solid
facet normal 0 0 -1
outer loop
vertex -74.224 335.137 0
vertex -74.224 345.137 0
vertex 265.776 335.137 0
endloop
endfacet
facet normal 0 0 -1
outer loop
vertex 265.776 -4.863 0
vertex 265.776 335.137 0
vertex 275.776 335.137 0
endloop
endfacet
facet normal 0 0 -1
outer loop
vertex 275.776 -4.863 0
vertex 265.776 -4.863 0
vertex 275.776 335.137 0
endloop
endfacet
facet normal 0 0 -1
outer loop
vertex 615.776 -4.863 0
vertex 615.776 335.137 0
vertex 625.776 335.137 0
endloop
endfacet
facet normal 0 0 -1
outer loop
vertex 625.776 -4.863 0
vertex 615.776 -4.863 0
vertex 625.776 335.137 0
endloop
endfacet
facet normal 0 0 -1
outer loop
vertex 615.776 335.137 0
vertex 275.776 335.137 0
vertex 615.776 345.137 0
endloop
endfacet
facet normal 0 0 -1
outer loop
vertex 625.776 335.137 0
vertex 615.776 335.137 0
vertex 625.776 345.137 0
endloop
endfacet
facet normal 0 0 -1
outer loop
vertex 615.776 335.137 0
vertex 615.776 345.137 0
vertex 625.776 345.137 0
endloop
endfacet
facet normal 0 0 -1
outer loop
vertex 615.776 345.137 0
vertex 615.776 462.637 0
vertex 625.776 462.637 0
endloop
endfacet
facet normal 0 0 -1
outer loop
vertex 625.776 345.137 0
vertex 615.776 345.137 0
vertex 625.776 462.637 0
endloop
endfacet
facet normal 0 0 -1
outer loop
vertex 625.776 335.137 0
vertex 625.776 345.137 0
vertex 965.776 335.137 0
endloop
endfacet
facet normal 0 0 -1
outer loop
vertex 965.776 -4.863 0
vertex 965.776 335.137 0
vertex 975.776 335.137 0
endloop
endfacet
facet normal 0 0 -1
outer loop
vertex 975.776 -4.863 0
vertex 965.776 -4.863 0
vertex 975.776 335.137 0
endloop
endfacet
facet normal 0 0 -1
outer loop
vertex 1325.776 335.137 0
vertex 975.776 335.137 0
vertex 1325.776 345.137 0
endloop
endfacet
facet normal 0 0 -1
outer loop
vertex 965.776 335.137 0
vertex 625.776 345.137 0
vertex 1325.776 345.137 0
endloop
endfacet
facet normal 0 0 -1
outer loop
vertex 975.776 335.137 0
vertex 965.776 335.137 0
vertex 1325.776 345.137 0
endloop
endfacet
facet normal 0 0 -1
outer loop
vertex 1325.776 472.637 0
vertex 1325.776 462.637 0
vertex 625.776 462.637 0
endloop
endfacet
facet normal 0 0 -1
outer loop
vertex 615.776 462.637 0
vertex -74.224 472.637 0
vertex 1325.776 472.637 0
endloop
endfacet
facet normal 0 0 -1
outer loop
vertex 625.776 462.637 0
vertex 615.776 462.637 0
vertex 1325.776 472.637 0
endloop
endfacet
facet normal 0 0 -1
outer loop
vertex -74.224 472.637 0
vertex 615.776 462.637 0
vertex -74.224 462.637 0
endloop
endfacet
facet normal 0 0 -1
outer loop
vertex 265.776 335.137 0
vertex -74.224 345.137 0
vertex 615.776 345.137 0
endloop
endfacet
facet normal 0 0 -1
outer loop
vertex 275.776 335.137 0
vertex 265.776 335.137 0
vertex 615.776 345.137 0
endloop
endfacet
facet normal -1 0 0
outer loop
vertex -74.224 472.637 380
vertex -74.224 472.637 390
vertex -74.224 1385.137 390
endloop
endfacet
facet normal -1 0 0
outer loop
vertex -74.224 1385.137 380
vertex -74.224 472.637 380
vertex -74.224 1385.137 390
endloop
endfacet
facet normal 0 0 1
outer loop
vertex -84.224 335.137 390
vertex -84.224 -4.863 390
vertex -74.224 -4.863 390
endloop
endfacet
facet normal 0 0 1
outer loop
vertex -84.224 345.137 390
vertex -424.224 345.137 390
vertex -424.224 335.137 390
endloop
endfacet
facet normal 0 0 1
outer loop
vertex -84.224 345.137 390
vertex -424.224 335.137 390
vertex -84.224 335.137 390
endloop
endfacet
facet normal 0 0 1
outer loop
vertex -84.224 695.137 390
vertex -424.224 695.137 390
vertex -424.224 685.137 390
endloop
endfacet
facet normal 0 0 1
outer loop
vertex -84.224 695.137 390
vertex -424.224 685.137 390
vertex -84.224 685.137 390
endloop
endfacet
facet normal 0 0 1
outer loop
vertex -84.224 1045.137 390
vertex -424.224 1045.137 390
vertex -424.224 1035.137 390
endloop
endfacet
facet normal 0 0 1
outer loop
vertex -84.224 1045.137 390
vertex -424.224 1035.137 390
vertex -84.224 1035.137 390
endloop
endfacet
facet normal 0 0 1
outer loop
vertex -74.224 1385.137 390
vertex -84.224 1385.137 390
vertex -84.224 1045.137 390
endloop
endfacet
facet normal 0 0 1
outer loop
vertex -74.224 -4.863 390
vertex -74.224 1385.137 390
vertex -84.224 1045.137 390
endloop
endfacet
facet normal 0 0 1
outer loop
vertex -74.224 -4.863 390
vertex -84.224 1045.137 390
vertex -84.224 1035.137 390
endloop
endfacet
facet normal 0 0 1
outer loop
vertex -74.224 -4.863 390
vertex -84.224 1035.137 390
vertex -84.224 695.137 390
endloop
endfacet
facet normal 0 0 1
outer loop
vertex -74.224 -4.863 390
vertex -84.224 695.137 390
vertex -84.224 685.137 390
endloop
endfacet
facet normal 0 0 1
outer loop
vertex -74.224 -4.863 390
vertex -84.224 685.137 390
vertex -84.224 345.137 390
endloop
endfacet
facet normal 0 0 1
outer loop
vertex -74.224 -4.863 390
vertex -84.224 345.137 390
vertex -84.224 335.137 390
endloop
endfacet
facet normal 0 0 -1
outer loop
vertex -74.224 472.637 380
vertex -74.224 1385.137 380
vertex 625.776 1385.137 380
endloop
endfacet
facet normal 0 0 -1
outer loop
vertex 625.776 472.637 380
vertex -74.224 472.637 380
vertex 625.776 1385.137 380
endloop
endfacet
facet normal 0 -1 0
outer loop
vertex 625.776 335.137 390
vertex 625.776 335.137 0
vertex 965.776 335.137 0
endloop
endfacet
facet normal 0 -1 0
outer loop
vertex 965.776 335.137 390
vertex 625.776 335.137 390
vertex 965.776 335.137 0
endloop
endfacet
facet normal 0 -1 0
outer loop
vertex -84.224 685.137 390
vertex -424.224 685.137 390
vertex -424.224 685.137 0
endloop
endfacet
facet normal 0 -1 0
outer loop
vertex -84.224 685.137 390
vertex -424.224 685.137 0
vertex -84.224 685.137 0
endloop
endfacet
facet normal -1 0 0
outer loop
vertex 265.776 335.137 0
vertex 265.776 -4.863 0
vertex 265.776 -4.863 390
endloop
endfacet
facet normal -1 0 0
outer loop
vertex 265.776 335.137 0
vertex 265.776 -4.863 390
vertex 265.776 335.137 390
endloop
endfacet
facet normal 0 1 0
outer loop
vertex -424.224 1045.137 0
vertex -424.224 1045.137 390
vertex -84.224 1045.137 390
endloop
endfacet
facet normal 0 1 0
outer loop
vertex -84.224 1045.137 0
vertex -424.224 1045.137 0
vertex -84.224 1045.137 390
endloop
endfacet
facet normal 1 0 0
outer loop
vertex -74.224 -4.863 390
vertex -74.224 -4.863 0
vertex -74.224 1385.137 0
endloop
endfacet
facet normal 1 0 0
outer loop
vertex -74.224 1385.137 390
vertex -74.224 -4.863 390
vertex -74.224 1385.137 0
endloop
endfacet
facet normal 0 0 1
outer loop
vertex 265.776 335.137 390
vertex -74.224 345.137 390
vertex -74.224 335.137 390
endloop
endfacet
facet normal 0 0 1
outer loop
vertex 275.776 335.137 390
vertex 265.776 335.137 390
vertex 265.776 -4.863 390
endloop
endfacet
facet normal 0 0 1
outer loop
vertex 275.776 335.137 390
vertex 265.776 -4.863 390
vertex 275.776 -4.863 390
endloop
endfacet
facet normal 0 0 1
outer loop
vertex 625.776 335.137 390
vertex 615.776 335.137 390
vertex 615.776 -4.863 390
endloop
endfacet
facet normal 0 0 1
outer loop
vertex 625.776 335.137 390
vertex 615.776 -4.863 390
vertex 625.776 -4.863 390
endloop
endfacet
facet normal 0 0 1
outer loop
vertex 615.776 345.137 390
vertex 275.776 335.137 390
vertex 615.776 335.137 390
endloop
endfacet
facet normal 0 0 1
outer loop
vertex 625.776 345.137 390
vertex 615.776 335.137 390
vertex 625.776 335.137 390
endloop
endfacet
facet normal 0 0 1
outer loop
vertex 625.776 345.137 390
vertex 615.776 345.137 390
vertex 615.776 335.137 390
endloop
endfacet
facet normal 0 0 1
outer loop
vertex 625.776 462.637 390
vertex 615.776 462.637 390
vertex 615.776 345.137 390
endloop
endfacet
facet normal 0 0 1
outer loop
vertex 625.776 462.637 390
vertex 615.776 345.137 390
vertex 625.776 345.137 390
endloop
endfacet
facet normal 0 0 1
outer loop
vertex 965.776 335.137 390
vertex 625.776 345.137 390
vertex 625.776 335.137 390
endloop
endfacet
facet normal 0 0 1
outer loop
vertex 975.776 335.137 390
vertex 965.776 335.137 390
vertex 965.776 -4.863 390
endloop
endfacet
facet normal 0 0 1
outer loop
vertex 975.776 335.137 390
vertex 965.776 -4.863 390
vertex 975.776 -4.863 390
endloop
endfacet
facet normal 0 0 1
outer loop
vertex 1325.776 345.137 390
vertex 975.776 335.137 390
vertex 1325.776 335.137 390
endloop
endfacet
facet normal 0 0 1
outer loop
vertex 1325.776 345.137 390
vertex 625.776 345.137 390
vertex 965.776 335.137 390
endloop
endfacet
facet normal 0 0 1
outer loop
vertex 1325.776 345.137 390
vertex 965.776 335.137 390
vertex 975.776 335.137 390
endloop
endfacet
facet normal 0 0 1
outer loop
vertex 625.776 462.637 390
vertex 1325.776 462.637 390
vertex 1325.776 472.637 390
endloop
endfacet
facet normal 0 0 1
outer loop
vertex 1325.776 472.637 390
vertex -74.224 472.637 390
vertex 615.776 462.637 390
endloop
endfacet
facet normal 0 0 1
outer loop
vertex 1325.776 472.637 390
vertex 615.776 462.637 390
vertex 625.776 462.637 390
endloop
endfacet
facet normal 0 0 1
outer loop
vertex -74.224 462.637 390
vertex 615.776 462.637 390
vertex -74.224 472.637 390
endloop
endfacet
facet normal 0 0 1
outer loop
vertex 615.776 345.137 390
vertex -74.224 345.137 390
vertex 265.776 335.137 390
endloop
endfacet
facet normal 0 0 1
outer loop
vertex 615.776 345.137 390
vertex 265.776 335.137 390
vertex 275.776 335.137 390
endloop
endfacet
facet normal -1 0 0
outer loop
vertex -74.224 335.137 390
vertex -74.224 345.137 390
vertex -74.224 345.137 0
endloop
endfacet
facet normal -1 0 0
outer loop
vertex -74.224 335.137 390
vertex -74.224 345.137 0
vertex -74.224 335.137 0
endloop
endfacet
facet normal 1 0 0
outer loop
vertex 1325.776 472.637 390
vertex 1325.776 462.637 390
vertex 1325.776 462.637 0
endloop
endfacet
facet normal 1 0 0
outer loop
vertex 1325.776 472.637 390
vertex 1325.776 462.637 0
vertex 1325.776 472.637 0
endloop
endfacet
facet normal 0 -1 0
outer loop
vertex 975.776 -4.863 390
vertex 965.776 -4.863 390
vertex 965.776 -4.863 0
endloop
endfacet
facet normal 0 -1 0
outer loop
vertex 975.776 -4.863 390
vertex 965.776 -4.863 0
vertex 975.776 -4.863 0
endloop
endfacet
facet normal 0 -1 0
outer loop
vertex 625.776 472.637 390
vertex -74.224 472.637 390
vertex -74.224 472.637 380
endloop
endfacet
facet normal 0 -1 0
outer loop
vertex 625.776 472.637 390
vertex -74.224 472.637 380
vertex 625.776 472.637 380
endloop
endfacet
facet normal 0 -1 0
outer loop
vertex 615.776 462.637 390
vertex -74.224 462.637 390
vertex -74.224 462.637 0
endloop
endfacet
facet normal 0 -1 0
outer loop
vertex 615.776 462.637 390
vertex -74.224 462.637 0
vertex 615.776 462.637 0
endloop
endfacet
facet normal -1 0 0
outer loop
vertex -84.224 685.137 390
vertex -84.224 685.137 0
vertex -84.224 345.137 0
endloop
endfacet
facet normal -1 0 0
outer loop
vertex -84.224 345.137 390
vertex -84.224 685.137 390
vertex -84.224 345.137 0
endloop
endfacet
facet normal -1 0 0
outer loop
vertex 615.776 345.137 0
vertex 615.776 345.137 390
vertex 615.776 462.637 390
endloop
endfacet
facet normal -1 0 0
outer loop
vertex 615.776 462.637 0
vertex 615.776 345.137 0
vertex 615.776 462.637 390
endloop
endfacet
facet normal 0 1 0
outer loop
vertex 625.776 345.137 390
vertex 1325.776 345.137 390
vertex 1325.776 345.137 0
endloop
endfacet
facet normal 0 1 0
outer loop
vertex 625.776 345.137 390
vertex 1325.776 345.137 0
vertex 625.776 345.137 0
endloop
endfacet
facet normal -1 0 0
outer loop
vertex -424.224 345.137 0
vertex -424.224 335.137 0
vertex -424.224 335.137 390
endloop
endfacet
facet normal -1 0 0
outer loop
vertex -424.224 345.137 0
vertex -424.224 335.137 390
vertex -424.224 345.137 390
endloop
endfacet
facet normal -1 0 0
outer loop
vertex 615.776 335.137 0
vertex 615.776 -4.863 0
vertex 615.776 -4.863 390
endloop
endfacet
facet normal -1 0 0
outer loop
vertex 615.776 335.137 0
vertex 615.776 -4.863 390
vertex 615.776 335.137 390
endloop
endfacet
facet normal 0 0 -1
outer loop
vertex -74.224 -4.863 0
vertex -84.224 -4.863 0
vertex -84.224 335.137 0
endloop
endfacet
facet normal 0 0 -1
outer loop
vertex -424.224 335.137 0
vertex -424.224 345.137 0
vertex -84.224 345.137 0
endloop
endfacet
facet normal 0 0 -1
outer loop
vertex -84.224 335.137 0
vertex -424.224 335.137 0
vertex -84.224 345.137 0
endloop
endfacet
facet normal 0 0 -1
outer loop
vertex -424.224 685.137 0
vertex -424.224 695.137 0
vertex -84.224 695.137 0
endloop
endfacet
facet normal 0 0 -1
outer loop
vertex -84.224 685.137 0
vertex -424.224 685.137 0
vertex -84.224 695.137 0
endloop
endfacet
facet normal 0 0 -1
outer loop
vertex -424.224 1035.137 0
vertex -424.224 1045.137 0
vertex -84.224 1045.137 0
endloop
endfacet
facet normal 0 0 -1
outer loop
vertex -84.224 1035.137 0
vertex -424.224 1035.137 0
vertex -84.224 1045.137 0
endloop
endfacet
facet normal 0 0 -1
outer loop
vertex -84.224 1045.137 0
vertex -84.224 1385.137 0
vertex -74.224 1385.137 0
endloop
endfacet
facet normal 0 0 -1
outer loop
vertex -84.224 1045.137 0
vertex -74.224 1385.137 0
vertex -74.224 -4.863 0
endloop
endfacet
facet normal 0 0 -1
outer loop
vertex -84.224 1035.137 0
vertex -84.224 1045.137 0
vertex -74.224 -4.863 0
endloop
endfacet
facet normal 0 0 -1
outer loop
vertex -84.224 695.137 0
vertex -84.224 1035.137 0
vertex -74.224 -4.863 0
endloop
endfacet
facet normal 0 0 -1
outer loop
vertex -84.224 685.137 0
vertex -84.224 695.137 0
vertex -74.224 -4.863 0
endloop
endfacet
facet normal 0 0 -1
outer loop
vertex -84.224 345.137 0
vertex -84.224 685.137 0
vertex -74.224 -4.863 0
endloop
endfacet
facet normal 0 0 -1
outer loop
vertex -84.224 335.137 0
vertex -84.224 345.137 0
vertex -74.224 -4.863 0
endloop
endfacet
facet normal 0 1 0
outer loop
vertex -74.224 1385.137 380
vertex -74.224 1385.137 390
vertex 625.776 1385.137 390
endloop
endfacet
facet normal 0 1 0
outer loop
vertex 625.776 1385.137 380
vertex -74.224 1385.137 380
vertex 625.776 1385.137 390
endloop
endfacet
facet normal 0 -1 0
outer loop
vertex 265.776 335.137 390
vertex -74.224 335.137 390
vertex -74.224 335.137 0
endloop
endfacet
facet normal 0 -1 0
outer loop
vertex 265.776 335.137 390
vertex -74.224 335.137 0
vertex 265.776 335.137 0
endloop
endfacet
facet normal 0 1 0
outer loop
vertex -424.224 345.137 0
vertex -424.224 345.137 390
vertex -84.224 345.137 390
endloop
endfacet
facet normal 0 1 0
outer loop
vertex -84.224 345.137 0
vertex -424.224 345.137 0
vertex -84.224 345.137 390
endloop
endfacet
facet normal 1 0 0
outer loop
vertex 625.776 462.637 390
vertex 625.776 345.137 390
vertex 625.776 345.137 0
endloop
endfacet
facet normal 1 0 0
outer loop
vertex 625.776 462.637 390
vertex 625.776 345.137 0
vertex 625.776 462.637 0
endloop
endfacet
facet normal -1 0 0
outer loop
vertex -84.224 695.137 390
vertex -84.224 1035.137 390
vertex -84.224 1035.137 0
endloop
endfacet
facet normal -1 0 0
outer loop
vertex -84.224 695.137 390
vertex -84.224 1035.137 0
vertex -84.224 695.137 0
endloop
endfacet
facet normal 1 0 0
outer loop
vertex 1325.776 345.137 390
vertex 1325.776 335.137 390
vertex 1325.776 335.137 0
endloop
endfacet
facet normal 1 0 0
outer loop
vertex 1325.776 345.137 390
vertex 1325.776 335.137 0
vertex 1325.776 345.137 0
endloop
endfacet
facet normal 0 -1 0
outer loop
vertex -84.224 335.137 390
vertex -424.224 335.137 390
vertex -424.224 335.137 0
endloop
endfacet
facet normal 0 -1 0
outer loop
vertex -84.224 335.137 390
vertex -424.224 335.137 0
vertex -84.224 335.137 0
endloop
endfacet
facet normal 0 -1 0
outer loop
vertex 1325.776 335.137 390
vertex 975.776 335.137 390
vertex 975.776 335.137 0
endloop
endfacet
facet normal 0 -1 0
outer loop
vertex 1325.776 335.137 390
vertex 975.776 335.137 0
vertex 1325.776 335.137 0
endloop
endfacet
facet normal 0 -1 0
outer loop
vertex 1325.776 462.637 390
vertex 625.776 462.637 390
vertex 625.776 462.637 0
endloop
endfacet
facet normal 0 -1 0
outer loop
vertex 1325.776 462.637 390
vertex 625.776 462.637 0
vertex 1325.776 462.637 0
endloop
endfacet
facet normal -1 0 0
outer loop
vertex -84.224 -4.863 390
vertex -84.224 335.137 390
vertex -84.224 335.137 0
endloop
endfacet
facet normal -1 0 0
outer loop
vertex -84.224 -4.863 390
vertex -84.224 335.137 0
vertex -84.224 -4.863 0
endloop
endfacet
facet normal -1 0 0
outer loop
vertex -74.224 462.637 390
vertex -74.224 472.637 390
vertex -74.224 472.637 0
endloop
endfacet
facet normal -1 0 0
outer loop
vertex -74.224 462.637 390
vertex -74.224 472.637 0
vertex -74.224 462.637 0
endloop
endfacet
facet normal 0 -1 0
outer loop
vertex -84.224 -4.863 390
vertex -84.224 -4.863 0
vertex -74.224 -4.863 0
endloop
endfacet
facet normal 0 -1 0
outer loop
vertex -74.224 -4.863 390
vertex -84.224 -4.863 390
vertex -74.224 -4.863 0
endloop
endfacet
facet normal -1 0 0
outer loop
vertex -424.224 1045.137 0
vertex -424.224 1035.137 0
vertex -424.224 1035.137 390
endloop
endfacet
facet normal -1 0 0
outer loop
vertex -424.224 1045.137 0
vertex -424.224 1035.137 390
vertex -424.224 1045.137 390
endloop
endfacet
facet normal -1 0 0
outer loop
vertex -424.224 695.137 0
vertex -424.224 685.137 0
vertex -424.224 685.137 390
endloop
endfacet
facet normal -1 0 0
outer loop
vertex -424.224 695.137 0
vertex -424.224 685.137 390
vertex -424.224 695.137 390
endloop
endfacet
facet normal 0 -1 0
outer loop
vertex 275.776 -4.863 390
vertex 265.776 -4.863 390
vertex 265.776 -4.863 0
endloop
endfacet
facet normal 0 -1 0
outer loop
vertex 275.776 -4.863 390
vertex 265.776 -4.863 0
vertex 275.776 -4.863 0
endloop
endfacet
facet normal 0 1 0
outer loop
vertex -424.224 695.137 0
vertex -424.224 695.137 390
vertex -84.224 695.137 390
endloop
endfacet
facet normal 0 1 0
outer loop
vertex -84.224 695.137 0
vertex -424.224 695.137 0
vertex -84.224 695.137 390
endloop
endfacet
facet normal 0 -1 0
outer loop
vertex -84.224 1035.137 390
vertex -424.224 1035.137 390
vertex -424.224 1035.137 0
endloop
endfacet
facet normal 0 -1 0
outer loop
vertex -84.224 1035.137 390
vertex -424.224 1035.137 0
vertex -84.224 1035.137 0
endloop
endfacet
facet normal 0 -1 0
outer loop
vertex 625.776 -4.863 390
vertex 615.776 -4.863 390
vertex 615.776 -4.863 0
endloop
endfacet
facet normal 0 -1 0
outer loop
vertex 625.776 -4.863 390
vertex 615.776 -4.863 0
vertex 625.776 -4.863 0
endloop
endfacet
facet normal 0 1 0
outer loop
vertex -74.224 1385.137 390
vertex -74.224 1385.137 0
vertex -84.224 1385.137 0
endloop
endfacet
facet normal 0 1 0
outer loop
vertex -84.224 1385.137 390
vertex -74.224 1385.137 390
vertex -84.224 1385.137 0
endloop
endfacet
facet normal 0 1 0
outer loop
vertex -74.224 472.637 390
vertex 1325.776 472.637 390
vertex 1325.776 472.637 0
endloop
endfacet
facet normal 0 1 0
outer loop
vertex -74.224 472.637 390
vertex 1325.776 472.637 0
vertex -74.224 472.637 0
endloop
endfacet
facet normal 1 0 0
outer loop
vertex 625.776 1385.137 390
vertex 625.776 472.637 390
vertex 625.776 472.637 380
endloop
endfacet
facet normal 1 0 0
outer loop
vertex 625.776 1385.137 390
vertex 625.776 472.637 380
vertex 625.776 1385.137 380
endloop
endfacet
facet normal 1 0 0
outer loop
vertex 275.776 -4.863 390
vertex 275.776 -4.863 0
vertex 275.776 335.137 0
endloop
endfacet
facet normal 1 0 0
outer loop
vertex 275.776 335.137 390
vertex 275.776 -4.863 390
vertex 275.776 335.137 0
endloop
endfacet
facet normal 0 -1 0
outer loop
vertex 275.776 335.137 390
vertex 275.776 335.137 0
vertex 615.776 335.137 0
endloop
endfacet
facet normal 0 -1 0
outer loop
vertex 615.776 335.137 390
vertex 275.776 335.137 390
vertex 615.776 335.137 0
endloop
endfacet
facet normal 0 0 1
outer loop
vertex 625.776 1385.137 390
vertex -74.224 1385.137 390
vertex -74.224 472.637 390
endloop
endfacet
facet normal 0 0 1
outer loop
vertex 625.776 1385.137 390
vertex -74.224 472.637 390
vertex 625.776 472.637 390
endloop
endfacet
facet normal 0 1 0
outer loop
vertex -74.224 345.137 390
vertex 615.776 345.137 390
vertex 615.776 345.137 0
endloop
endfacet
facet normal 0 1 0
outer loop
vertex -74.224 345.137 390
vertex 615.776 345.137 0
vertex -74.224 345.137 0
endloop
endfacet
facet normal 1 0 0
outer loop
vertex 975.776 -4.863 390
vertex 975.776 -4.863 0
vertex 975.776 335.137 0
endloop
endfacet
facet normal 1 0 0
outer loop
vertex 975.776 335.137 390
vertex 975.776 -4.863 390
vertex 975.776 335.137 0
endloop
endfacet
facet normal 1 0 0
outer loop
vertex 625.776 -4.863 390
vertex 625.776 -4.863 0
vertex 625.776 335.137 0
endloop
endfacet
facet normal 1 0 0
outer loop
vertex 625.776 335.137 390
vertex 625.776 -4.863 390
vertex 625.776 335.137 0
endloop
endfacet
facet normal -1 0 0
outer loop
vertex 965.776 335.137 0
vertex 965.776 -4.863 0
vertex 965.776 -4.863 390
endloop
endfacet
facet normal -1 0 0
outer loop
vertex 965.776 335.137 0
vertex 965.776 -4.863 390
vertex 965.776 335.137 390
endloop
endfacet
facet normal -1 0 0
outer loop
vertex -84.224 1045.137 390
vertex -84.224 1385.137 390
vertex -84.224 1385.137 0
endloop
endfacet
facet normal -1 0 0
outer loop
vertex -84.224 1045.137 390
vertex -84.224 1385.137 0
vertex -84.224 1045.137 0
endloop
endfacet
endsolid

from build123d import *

# Parameters (mm, degrees)
F0_W     = 10
F0_H     = 1390
F2_DEPTH = 390
F1_W     = 340
F1_H     = 10
F3_W     = 10
F3_H     = 117.5
F3_H_2   = 340
F4_DEPTH = 390
F5_W     = 700
F5_H     = 912.5
F6_DEPTH = 10


with BuildPart() as f2:
    # F0 (on Top) → F2 (new body)
    with BuildSketch(Plane.XY):
        with Locations((-79.2238954455, 690.137084249)):
            Rectangle(F0_W, F0_H)
    extrude(amount=F2_DEPTH)


with BuildPart() as f2b:
    # F1 (on face) → F2, piece 2 (new body)
    with BuildSketch(Plane.XY):
        with Locations((-254.2238954455, 1040.137084249)):
            Rectangle(F1_W, F1_H)
        with Locations((-254.2238954455, 690.137084249)):
            Rectangle(F1_W, F1_H)
        with Locations((-254.2238954455, 340.137084249)):
            Rectangle(F1_W, F1_H)
        Polygon((-84.2238954455, 1385.137084249), (-84.2238954455, 1045.137084249), (-84.2238954455, 1035.137084249), (-84.2238954455, 695.137084249), (-84.2238954455, 685.137084249), (-84.2238954455, 345.137084249), (-84.2238954455, 335.137084249), (-84.2238954455, -4.862915751), (-74.2238954455, -4.862915751), (-74.2238954455, 1385.137084249), align=None)
    extrude(amount=F2_DEPTH)


with BuildPart() as f4:
    # F3 (on face) → F4 (new body, through all)
    with BuildSketch(Plane.XY.offset(390)):
        Polygon((615.7761045545, 345.137084249), (-74.2238954455, 345.137084249), (-74.2238954455, 335.137084249), (265.7761045545, 335.137084249), (275.7761045545, 335.137084249), (615.7761045545, 335.137084249), (625.7761045545, 335.137084249), (965.7761045545, 335.137084249), (975.7761045545, 335.137084249), (1325.7761045545, 335.137084249), (1325.7761045545, 345.137084249), (625.7761045545, 345.137084249), align=None)
        with Locations((620.7761045545, 403.887084249)):
            Rectangle(F3_W, F3_H)
        Polygon((-74.2238954455, 462.637084249), (615.7761045545, 462.637084249), (625.7761045545, 462.637084249), (1325.7761045545, 462.637084249), (1325.7761045545, 472.637084249), (-74.2238954455, 472.637084249), align=None)
        with Locations((270.7761045545, 165.137084249)):
            Rectangle(F3_W, F3_H_2)
        with Locations((620.7761045545, 165.137084249)):
            Rectangle(F3_W, F3_H_2)
        with Locations((970.7761045545, 165.137084249)):
            Rectangle(F3_W, F3_H_2)
    extrude(amount=-F4_DEPTH)


with BuildPart() as f6:
    # F5 (on face) → F6 (new body)
    with BuildSketch(Plane.XY.offset(390)):
        with Locations((275.7761045545, 928.887084249)):
            Rectangle(F5_W, F5_H)
    extrude(amount=-F6_DEPTH)


solid = Compound([f2b.part, f4.part, f6.part])
